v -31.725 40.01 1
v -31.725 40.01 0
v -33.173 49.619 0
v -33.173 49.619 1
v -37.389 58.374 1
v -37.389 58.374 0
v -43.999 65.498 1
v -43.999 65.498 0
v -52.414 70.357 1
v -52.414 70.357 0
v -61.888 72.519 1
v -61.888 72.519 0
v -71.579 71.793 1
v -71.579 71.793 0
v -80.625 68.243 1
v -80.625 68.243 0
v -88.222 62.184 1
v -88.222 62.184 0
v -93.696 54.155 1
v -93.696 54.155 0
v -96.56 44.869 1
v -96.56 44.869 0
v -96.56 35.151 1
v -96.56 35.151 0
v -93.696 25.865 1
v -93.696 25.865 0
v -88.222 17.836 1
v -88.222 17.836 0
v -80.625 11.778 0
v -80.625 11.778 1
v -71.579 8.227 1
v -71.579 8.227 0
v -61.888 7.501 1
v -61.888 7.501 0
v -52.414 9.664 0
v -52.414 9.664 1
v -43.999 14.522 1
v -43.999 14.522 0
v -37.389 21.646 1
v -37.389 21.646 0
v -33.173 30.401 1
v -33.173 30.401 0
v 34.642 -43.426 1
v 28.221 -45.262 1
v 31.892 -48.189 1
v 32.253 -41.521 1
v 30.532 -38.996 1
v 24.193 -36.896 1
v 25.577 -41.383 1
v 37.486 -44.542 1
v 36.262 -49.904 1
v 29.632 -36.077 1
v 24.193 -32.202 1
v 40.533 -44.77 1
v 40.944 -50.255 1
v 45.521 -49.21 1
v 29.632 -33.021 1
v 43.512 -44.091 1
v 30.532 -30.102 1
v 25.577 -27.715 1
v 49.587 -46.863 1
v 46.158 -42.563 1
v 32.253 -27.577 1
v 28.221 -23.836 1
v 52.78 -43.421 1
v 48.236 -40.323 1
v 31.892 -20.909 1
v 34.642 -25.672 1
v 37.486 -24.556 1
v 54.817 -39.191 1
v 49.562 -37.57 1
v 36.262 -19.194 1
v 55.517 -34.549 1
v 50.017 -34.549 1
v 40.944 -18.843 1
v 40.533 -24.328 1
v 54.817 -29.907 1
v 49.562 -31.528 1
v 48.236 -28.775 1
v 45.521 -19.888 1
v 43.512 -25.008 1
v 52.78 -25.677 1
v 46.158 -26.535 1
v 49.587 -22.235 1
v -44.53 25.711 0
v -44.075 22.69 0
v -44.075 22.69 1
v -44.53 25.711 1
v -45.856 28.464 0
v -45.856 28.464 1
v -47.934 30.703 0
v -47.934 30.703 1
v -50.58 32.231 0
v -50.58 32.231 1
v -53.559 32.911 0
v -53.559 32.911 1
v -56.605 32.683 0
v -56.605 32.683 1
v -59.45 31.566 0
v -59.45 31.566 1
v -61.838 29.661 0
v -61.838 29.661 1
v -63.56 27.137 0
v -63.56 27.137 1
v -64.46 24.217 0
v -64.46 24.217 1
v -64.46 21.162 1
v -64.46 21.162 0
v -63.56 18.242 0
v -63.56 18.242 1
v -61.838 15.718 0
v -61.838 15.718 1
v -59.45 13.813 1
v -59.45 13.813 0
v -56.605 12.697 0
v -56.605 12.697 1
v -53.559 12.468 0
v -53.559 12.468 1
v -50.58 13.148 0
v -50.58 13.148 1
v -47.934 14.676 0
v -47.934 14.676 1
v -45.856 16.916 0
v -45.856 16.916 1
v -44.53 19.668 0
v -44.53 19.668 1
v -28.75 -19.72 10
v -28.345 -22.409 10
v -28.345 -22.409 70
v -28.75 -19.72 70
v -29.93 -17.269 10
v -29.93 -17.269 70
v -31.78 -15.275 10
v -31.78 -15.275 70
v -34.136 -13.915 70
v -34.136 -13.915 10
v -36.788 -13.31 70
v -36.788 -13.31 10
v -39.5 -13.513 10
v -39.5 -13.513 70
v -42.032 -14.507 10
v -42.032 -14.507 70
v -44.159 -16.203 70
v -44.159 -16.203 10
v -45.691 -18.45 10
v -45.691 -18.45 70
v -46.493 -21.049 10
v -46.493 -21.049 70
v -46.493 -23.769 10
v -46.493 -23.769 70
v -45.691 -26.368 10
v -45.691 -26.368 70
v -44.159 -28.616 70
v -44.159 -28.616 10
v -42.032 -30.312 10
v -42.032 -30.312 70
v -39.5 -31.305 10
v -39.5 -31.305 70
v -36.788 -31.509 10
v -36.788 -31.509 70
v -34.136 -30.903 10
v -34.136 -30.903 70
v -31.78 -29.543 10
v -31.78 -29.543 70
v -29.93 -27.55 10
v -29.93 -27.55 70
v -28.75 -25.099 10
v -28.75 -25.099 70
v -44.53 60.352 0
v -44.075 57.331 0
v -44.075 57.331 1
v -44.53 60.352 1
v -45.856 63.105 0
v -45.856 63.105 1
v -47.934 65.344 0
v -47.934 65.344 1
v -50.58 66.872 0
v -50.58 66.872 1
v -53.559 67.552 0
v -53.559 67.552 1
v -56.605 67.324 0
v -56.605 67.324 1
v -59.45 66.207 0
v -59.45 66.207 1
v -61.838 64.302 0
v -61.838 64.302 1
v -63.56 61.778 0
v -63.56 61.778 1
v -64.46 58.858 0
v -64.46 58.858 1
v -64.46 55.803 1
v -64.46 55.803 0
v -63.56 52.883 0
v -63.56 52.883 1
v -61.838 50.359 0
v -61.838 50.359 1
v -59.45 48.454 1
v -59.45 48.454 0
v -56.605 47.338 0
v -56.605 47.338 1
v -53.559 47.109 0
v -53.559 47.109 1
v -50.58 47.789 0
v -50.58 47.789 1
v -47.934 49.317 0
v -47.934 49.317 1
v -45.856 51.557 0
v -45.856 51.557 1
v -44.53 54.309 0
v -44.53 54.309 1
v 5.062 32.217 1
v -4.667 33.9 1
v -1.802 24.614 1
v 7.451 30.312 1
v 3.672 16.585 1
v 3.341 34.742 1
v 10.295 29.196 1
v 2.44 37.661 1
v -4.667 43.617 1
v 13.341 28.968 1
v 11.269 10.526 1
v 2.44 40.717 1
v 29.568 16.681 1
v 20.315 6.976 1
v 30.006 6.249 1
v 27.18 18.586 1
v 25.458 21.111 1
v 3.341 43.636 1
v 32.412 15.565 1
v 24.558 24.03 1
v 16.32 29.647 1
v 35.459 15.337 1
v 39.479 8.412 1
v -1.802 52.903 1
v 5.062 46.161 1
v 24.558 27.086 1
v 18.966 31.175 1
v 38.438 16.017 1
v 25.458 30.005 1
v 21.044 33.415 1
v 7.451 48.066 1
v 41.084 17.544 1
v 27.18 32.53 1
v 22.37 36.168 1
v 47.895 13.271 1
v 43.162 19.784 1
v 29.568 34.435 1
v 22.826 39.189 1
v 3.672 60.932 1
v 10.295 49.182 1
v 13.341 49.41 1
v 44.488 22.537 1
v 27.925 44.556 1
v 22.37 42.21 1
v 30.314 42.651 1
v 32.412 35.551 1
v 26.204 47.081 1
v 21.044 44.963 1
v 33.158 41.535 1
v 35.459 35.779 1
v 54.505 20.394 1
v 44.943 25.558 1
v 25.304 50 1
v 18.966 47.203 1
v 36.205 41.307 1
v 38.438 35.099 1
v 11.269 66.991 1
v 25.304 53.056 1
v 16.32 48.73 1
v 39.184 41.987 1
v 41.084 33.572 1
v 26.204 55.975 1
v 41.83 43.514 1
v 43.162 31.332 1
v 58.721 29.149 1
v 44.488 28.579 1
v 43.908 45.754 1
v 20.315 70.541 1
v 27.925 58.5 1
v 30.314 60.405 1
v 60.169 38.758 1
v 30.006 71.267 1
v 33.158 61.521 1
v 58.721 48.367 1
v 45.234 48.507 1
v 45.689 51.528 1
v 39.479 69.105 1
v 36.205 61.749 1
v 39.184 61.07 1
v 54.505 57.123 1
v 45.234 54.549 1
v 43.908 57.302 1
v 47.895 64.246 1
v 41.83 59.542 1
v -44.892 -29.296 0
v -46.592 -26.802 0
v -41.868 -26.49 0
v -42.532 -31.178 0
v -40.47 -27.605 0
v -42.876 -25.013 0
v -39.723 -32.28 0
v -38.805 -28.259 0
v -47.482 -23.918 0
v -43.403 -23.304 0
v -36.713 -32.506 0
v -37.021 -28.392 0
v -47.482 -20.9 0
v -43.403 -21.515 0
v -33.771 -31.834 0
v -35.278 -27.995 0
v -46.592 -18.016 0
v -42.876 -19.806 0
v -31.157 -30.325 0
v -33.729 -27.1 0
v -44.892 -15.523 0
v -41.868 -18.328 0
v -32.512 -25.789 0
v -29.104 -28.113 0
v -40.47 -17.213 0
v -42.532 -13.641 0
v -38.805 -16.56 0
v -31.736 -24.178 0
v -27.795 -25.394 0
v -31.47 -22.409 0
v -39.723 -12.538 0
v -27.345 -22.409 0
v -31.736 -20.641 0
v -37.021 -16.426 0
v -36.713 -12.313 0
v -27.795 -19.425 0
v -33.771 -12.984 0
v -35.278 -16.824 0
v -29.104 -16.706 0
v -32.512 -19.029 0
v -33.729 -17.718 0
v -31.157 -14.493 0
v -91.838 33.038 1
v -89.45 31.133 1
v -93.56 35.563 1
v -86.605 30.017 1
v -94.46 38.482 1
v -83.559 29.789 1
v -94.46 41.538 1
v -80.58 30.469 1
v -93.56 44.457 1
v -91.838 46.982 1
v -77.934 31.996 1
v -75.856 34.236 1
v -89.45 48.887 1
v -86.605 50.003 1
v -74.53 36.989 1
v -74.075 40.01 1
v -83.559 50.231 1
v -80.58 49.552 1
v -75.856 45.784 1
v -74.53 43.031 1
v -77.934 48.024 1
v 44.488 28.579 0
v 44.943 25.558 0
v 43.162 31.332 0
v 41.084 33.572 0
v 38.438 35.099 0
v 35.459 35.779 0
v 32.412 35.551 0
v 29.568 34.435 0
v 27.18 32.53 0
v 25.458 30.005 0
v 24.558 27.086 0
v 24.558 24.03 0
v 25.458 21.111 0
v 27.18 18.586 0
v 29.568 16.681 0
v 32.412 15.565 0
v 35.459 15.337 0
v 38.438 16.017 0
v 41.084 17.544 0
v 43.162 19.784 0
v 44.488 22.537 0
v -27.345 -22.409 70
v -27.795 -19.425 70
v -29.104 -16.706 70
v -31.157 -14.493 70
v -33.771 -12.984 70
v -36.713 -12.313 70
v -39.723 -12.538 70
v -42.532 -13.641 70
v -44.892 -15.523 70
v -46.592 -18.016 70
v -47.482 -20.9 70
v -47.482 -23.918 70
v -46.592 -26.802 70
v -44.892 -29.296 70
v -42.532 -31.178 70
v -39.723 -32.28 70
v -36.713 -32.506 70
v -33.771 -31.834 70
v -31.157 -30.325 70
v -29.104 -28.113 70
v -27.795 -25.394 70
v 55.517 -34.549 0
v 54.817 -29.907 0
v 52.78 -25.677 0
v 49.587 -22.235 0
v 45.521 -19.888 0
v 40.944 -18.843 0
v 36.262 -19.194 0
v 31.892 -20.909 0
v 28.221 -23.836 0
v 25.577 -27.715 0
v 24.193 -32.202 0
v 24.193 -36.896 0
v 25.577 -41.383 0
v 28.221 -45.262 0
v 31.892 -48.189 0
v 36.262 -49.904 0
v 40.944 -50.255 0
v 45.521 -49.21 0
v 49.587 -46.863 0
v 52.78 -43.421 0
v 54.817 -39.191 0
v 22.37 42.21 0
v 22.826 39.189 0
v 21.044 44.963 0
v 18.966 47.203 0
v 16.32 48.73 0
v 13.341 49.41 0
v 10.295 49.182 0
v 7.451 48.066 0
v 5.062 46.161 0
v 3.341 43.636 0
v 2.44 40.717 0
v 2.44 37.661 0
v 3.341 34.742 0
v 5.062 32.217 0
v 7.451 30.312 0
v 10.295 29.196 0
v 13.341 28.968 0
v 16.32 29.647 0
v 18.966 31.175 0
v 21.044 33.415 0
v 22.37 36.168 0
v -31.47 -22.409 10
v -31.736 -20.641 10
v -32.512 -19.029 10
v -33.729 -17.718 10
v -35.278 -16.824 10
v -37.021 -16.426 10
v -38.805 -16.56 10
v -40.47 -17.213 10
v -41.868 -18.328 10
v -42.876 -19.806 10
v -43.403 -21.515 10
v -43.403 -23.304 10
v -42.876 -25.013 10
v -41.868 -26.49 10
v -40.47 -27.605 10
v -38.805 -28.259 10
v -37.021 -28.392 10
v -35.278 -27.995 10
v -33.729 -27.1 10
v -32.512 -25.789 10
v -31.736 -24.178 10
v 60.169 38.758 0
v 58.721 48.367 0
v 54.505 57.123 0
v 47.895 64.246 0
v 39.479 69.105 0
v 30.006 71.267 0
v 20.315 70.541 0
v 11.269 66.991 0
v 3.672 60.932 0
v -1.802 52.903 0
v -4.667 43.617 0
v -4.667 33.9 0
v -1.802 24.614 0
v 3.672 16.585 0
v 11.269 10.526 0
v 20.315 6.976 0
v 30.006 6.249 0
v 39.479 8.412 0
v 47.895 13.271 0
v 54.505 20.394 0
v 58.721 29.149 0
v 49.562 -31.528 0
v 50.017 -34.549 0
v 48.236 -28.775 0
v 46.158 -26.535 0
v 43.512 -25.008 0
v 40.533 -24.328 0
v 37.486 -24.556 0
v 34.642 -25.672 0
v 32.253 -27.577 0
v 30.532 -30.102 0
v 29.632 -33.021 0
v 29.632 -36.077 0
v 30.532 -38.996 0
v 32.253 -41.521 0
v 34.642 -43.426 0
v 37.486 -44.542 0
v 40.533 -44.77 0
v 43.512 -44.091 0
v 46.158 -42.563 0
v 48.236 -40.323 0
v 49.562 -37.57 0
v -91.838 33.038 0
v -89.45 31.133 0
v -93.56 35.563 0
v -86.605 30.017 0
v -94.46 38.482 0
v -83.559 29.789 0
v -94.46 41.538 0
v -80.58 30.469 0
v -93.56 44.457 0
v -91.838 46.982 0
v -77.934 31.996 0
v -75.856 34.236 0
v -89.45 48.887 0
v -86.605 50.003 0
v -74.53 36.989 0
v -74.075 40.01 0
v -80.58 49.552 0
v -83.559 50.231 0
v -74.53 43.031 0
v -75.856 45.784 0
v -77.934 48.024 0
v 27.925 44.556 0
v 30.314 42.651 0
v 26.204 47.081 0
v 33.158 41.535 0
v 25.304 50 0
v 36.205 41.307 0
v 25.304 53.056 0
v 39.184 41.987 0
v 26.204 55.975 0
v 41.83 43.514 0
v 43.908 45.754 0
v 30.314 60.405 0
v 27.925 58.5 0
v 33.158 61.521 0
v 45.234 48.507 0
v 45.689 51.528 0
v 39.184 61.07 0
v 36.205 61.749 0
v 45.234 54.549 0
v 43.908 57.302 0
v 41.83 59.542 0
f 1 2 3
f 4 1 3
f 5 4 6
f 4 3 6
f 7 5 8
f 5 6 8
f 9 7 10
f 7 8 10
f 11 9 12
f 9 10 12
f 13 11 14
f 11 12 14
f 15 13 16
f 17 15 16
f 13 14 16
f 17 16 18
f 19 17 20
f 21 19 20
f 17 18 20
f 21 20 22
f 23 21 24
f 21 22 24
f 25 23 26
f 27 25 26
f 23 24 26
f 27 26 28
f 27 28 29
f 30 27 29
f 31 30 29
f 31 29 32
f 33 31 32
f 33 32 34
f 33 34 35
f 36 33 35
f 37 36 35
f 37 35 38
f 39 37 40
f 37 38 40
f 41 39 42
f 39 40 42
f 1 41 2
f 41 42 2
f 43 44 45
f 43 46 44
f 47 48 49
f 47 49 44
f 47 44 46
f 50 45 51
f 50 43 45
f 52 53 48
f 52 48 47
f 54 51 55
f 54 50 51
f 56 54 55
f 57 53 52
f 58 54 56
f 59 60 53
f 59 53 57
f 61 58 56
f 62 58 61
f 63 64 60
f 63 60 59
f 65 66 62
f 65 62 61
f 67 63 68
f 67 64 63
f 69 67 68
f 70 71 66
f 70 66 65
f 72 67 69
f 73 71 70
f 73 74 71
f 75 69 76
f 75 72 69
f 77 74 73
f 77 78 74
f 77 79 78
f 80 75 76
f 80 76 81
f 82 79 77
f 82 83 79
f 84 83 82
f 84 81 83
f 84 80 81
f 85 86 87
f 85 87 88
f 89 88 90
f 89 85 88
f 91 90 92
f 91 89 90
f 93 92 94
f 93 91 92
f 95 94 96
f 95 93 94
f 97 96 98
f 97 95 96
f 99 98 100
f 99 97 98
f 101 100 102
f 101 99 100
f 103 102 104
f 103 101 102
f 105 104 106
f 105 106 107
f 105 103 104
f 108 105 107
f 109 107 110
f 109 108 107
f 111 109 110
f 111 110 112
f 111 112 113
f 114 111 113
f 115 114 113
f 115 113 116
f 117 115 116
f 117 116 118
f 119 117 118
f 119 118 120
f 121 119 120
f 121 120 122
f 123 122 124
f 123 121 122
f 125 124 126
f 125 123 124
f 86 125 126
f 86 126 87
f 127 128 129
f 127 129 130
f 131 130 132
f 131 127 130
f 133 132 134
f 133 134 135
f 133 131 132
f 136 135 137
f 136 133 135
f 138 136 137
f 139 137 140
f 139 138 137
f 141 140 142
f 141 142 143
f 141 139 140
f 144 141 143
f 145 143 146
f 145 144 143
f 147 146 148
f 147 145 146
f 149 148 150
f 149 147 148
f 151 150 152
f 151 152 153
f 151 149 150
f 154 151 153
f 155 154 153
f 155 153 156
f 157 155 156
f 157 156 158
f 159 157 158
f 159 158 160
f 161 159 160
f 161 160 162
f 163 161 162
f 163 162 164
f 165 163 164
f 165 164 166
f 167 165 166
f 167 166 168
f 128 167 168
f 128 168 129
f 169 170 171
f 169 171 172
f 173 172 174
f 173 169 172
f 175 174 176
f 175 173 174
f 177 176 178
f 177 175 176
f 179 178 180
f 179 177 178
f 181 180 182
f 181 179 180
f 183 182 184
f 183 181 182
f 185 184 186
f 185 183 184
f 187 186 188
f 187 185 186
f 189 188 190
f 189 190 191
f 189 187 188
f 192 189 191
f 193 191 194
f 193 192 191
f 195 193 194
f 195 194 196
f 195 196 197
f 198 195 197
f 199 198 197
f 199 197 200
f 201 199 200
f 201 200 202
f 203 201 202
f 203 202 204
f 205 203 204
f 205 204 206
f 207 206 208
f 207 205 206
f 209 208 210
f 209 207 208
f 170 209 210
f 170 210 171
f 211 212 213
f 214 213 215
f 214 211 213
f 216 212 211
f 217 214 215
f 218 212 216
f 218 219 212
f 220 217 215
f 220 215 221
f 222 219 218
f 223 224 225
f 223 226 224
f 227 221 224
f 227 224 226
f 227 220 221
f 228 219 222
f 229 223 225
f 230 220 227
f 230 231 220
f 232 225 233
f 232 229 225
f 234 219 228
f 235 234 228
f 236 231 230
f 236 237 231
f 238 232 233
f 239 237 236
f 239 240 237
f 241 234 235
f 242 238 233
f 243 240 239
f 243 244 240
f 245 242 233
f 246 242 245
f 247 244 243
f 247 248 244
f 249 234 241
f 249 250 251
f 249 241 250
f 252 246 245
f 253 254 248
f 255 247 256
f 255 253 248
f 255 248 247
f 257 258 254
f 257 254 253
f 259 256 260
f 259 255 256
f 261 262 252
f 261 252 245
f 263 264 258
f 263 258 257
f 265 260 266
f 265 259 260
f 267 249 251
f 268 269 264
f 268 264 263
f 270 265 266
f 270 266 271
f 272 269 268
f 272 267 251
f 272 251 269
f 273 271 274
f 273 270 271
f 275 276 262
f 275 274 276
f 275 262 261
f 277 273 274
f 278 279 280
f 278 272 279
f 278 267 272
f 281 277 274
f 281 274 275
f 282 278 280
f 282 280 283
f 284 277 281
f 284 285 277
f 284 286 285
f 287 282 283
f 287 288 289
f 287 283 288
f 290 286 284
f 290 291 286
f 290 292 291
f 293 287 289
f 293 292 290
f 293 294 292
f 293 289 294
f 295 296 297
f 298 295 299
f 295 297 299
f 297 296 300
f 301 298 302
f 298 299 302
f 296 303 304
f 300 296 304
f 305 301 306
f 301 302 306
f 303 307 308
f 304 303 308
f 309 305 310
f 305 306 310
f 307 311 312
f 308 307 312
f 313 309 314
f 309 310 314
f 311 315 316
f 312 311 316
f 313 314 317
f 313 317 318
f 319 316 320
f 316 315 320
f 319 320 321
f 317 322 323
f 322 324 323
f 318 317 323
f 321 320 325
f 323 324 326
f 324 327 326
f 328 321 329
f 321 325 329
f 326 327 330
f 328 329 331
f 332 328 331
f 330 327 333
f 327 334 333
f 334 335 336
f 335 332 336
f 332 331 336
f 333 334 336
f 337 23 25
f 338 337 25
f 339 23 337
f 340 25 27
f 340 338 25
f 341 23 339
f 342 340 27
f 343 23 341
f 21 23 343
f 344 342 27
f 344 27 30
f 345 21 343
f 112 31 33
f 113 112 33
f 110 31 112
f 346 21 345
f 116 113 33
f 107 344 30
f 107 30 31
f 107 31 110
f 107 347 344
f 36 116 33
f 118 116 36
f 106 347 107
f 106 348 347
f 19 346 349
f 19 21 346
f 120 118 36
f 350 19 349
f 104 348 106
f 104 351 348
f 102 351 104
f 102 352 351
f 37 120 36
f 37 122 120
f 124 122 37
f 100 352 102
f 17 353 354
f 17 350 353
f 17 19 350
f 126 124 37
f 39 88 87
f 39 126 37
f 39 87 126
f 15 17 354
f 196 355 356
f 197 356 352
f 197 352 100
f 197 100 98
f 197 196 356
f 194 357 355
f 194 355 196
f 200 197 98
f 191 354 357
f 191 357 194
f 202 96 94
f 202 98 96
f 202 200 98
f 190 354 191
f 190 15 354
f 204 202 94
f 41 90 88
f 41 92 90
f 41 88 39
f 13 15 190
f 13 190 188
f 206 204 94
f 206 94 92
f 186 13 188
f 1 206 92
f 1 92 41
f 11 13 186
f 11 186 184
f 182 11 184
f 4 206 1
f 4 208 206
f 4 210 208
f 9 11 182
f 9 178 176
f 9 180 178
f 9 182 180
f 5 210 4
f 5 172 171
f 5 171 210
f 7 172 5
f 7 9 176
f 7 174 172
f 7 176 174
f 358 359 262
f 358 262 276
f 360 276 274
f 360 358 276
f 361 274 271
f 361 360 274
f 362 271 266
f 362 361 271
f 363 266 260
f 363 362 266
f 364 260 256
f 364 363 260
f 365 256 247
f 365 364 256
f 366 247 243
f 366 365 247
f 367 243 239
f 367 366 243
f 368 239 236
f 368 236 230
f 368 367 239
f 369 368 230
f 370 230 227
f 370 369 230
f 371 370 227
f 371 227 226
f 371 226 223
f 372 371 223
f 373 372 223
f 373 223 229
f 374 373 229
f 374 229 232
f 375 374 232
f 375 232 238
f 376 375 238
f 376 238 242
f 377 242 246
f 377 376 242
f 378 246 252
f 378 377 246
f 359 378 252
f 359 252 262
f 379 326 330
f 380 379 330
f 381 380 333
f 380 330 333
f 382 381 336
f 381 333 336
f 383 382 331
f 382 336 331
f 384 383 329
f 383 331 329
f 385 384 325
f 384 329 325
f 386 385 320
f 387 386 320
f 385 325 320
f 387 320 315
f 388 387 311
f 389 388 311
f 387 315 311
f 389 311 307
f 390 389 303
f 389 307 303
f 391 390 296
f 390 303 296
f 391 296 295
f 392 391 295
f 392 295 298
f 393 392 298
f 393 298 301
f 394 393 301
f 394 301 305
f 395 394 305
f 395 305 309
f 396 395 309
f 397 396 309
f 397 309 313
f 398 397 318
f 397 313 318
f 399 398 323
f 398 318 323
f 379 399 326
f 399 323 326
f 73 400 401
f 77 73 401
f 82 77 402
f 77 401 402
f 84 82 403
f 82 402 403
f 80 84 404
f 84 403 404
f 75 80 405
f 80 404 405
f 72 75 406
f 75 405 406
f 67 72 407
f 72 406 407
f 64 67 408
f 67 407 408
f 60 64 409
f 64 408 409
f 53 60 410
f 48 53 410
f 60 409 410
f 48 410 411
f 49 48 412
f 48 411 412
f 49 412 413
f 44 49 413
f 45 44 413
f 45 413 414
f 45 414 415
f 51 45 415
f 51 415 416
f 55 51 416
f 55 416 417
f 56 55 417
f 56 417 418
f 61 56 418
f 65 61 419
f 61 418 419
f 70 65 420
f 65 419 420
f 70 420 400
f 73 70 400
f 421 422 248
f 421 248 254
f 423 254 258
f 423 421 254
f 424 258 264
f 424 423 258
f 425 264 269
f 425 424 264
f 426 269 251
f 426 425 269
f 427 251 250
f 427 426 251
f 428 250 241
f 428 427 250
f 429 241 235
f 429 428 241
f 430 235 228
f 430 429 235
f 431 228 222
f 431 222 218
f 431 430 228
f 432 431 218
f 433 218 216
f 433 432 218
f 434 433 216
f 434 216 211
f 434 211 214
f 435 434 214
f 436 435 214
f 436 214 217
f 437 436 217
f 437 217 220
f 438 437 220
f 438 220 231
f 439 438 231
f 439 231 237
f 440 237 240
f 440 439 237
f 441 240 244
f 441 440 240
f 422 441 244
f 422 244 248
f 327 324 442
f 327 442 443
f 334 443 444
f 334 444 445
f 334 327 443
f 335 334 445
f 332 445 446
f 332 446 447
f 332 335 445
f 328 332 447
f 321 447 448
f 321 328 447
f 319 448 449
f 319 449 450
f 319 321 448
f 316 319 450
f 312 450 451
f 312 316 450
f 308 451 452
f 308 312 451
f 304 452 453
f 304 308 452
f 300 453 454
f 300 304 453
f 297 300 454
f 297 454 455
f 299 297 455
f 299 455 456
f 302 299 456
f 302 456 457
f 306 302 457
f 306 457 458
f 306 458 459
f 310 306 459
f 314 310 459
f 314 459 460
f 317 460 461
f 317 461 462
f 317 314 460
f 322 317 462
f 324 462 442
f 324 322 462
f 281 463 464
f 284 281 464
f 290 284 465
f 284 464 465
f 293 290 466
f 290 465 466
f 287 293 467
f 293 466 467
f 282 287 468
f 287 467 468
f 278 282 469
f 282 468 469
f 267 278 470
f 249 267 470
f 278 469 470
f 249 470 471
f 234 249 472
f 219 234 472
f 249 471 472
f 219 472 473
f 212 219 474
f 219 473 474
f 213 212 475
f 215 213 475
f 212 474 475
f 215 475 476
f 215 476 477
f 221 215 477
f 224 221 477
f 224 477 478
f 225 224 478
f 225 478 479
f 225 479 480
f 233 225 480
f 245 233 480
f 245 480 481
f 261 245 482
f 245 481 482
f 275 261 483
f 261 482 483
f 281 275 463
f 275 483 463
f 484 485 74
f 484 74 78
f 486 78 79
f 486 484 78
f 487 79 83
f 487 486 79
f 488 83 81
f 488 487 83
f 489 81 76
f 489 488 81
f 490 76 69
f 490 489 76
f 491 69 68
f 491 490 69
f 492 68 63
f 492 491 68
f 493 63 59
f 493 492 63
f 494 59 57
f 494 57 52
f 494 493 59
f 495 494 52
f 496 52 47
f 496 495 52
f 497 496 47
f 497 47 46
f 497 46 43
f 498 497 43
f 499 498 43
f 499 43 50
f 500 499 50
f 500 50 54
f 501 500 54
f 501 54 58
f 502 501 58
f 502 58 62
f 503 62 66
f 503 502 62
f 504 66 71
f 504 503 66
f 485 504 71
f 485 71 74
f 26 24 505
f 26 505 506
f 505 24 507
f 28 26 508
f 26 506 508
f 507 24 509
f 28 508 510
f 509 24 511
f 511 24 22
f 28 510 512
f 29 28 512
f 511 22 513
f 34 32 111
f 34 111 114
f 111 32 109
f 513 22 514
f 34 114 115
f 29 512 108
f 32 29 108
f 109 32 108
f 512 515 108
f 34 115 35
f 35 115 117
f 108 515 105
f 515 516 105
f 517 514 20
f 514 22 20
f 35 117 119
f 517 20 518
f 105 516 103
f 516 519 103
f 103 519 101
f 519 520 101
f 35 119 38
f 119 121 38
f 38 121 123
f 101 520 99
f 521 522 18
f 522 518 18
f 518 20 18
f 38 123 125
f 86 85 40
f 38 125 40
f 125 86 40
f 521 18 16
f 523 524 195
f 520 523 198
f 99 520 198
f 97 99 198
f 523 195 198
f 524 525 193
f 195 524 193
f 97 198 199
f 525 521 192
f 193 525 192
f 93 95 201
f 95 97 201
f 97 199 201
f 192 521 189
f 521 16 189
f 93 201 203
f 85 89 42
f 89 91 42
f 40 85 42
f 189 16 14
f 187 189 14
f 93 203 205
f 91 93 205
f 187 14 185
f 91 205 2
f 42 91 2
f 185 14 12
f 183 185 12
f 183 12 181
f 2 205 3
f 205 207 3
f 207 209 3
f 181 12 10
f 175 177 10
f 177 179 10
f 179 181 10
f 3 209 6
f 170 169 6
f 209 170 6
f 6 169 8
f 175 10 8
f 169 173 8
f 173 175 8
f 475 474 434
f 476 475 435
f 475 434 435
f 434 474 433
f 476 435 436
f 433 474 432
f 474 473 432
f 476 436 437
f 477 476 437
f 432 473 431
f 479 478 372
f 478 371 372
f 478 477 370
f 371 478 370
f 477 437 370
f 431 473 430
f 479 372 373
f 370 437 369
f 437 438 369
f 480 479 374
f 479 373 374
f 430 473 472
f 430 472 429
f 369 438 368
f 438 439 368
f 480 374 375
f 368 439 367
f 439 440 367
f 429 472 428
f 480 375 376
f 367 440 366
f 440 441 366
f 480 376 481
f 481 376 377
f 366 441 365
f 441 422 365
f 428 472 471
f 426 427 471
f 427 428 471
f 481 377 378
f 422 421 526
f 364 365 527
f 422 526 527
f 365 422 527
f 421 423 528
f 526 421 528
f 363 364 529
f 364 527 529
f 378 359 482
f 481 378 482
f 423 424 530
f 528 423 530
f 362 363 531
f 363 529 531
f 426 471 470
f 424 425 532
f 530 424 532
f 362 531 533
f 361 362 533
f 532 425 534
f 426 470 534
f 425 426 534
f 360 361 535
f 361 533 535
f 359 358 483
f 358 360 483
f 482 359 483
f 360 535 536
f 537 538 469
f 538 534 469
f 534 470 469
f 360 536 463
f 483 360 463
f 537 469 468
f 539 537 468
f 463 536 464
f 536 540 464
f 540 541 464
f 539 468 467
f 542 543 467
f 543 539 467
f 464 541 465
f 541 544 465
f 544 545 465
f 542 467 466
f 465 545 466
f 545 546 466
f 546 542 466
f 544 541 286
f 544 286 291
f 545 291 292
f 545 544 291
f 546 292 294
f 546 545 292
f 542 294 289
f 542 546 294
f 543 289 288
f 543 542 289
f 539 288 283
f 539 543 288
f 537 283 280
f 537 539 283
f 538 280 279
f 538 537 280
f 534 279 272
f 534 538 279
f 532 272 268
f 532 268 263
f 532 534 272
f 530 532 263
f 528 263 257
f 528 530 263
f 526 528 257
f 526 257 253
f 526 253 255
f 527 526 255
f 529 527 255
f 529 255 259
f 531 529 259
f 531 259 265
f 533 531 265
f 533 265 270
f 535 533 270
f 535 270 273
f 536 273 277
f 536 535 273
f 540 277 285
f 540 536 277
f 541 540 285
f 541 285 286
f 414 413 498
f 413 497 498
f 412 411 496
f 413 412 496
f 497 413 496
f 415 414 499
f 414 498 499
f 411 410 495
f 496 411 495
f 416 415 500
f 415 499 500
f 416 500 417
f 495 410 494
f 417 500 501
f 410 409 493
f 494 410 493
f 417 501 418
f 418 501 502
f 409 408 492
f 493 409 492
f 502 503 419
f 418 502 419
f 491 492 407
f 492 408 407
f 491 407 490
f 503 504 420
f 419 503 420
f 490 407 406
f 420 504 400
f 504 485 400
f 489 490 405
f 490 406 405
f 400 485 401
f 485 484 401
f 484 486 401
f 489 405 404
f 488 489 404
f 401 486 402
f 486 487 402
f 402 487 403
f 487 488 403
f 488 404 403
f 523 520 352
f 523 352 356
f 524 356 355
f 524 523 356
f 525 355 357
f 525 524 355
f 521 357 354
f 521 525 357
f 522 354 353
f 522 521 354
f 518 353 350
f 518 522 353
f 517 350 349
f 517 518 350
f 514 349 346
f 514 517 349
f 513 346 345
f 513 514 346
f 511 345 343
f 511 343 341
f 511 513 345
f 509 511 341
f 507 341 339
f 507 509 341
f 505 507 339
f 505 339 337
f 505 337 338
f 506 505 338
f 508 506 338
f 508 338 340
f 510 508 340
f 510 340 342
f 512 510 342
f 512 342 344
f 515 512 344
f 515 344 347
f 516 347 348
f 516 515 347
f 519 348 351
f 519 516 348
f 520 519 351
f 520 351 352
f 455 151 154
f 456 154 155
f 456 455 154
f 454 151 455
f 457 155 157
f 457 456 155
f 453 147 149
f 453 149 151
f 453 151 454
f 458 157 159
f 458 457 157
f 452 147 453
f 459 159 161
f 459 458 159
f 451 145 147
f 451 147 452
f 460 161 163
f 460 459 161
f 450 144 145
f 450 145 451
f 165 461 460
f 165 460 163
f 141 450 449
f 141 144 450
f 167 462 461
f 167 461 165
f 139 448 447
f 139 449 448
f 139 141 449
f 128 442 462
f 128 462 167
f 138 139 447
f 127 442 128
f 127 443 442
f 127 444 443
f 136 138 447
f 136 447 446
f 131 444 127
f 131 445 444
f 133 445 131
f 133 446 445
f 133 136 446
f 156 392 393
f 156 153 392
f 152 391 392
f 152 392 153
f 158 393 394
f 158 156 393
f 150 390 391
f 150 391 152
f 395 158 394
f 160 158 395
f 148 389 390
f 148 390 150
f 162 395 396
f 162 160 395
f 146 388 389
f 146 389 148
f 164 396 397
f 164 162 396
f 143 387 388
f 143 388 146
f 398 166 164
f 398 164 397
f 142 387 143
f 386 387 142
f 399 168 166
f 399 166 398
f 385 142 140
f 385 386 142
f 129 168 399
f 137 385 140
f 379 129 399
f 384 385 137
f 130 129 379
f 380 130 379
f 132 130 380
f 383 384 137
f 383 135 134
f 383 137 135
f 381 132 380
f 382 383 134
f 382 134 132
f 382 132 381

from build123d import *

# Parameters (mm, degrees)
F0_R     = 32.6
F0_R_2   = 10.25
F1_DEPTH = 1
F0_R_3   = 10.125
F0_R_4   = 9.125
F2_DEPTH = 70
F0_R_5   = 6
F3_DEPTH = 10
F0_R_6   = 15.75
F4_DEPTH = 1


with BuildPart() as f1:
    # F0 (on Top) → F1 (new body)
    with BuildSketch(Plane.XY):
        with Locations((-64.324602, 40.010083)):
            Circle(F0_R)
        with Locations((-84.324602, 40.010083)):
            Circle(F0_R_2, mode=Mode.SUBTRACT)
        with Locations((-54.324602, 22.689575)):
            Circle(F0_R_2, mode=Mode.SUBTRACT)
        with Locations((-54.324602, 57.330592)):
            Circle(F0_R_2, mode=Mode.SUBTRACT)
        with Locations((27.569331, 38.758329)):
            Circle(F0_R)
        with Locations((12.575513, 39.188946)):
            Circle(F0_R_2, mode=Mode.SUBTRACT)
        with Locations((34.693315, 25.557994)):
            Circle(F0_R_2, mode=Mode.SUBTRACT)
        with Locations((35.439164, 51.528048)):
            Circle(F0_R_2, mode=Mode.SUBTRACT)
    extrude(amount=F1_DEPTH)


with BuildPart() as f2:
    # F0 (on Top) → F2 (new body)
    with BuildSketch(Plane.XY):
        with Locations((-37.46976, -22.409273)):
            Circle(F0_R_3)
        with Locations((-37.46976, -22.409273)):
            Circle(F0_R_4, mode=Mode.SUBTRACT)
    extrude(amount=F2_DEPTH)

    # F0 (on Top) → F3 (join)
    with BuildSketch(Plane.XY):
        with Locations((-37.46976, -22.409273)):
            Circle(F0_R_4)
        with Locations((-37.46976, -22.409273)):
            Circle(F0_R_5, mode=Mode.SUBTRACT)
    extrude(amount=F3_DEPTH)


with BuildPart() as f4:
    # F0 (on Top) → F4 (new body)
    with BuildSketch(Plane.XY):
        with Locations((39.767064, -34.549072)):
            Circle(F0_R_6)
        with Locations((39.767064, -34.549072)):
            Circle(F0_R_2, mode=Mode.SUBTRACT)
    extrude(amount=F4_DEPTH)


solid = Compound([f1.part, f2.part, f4.part])
